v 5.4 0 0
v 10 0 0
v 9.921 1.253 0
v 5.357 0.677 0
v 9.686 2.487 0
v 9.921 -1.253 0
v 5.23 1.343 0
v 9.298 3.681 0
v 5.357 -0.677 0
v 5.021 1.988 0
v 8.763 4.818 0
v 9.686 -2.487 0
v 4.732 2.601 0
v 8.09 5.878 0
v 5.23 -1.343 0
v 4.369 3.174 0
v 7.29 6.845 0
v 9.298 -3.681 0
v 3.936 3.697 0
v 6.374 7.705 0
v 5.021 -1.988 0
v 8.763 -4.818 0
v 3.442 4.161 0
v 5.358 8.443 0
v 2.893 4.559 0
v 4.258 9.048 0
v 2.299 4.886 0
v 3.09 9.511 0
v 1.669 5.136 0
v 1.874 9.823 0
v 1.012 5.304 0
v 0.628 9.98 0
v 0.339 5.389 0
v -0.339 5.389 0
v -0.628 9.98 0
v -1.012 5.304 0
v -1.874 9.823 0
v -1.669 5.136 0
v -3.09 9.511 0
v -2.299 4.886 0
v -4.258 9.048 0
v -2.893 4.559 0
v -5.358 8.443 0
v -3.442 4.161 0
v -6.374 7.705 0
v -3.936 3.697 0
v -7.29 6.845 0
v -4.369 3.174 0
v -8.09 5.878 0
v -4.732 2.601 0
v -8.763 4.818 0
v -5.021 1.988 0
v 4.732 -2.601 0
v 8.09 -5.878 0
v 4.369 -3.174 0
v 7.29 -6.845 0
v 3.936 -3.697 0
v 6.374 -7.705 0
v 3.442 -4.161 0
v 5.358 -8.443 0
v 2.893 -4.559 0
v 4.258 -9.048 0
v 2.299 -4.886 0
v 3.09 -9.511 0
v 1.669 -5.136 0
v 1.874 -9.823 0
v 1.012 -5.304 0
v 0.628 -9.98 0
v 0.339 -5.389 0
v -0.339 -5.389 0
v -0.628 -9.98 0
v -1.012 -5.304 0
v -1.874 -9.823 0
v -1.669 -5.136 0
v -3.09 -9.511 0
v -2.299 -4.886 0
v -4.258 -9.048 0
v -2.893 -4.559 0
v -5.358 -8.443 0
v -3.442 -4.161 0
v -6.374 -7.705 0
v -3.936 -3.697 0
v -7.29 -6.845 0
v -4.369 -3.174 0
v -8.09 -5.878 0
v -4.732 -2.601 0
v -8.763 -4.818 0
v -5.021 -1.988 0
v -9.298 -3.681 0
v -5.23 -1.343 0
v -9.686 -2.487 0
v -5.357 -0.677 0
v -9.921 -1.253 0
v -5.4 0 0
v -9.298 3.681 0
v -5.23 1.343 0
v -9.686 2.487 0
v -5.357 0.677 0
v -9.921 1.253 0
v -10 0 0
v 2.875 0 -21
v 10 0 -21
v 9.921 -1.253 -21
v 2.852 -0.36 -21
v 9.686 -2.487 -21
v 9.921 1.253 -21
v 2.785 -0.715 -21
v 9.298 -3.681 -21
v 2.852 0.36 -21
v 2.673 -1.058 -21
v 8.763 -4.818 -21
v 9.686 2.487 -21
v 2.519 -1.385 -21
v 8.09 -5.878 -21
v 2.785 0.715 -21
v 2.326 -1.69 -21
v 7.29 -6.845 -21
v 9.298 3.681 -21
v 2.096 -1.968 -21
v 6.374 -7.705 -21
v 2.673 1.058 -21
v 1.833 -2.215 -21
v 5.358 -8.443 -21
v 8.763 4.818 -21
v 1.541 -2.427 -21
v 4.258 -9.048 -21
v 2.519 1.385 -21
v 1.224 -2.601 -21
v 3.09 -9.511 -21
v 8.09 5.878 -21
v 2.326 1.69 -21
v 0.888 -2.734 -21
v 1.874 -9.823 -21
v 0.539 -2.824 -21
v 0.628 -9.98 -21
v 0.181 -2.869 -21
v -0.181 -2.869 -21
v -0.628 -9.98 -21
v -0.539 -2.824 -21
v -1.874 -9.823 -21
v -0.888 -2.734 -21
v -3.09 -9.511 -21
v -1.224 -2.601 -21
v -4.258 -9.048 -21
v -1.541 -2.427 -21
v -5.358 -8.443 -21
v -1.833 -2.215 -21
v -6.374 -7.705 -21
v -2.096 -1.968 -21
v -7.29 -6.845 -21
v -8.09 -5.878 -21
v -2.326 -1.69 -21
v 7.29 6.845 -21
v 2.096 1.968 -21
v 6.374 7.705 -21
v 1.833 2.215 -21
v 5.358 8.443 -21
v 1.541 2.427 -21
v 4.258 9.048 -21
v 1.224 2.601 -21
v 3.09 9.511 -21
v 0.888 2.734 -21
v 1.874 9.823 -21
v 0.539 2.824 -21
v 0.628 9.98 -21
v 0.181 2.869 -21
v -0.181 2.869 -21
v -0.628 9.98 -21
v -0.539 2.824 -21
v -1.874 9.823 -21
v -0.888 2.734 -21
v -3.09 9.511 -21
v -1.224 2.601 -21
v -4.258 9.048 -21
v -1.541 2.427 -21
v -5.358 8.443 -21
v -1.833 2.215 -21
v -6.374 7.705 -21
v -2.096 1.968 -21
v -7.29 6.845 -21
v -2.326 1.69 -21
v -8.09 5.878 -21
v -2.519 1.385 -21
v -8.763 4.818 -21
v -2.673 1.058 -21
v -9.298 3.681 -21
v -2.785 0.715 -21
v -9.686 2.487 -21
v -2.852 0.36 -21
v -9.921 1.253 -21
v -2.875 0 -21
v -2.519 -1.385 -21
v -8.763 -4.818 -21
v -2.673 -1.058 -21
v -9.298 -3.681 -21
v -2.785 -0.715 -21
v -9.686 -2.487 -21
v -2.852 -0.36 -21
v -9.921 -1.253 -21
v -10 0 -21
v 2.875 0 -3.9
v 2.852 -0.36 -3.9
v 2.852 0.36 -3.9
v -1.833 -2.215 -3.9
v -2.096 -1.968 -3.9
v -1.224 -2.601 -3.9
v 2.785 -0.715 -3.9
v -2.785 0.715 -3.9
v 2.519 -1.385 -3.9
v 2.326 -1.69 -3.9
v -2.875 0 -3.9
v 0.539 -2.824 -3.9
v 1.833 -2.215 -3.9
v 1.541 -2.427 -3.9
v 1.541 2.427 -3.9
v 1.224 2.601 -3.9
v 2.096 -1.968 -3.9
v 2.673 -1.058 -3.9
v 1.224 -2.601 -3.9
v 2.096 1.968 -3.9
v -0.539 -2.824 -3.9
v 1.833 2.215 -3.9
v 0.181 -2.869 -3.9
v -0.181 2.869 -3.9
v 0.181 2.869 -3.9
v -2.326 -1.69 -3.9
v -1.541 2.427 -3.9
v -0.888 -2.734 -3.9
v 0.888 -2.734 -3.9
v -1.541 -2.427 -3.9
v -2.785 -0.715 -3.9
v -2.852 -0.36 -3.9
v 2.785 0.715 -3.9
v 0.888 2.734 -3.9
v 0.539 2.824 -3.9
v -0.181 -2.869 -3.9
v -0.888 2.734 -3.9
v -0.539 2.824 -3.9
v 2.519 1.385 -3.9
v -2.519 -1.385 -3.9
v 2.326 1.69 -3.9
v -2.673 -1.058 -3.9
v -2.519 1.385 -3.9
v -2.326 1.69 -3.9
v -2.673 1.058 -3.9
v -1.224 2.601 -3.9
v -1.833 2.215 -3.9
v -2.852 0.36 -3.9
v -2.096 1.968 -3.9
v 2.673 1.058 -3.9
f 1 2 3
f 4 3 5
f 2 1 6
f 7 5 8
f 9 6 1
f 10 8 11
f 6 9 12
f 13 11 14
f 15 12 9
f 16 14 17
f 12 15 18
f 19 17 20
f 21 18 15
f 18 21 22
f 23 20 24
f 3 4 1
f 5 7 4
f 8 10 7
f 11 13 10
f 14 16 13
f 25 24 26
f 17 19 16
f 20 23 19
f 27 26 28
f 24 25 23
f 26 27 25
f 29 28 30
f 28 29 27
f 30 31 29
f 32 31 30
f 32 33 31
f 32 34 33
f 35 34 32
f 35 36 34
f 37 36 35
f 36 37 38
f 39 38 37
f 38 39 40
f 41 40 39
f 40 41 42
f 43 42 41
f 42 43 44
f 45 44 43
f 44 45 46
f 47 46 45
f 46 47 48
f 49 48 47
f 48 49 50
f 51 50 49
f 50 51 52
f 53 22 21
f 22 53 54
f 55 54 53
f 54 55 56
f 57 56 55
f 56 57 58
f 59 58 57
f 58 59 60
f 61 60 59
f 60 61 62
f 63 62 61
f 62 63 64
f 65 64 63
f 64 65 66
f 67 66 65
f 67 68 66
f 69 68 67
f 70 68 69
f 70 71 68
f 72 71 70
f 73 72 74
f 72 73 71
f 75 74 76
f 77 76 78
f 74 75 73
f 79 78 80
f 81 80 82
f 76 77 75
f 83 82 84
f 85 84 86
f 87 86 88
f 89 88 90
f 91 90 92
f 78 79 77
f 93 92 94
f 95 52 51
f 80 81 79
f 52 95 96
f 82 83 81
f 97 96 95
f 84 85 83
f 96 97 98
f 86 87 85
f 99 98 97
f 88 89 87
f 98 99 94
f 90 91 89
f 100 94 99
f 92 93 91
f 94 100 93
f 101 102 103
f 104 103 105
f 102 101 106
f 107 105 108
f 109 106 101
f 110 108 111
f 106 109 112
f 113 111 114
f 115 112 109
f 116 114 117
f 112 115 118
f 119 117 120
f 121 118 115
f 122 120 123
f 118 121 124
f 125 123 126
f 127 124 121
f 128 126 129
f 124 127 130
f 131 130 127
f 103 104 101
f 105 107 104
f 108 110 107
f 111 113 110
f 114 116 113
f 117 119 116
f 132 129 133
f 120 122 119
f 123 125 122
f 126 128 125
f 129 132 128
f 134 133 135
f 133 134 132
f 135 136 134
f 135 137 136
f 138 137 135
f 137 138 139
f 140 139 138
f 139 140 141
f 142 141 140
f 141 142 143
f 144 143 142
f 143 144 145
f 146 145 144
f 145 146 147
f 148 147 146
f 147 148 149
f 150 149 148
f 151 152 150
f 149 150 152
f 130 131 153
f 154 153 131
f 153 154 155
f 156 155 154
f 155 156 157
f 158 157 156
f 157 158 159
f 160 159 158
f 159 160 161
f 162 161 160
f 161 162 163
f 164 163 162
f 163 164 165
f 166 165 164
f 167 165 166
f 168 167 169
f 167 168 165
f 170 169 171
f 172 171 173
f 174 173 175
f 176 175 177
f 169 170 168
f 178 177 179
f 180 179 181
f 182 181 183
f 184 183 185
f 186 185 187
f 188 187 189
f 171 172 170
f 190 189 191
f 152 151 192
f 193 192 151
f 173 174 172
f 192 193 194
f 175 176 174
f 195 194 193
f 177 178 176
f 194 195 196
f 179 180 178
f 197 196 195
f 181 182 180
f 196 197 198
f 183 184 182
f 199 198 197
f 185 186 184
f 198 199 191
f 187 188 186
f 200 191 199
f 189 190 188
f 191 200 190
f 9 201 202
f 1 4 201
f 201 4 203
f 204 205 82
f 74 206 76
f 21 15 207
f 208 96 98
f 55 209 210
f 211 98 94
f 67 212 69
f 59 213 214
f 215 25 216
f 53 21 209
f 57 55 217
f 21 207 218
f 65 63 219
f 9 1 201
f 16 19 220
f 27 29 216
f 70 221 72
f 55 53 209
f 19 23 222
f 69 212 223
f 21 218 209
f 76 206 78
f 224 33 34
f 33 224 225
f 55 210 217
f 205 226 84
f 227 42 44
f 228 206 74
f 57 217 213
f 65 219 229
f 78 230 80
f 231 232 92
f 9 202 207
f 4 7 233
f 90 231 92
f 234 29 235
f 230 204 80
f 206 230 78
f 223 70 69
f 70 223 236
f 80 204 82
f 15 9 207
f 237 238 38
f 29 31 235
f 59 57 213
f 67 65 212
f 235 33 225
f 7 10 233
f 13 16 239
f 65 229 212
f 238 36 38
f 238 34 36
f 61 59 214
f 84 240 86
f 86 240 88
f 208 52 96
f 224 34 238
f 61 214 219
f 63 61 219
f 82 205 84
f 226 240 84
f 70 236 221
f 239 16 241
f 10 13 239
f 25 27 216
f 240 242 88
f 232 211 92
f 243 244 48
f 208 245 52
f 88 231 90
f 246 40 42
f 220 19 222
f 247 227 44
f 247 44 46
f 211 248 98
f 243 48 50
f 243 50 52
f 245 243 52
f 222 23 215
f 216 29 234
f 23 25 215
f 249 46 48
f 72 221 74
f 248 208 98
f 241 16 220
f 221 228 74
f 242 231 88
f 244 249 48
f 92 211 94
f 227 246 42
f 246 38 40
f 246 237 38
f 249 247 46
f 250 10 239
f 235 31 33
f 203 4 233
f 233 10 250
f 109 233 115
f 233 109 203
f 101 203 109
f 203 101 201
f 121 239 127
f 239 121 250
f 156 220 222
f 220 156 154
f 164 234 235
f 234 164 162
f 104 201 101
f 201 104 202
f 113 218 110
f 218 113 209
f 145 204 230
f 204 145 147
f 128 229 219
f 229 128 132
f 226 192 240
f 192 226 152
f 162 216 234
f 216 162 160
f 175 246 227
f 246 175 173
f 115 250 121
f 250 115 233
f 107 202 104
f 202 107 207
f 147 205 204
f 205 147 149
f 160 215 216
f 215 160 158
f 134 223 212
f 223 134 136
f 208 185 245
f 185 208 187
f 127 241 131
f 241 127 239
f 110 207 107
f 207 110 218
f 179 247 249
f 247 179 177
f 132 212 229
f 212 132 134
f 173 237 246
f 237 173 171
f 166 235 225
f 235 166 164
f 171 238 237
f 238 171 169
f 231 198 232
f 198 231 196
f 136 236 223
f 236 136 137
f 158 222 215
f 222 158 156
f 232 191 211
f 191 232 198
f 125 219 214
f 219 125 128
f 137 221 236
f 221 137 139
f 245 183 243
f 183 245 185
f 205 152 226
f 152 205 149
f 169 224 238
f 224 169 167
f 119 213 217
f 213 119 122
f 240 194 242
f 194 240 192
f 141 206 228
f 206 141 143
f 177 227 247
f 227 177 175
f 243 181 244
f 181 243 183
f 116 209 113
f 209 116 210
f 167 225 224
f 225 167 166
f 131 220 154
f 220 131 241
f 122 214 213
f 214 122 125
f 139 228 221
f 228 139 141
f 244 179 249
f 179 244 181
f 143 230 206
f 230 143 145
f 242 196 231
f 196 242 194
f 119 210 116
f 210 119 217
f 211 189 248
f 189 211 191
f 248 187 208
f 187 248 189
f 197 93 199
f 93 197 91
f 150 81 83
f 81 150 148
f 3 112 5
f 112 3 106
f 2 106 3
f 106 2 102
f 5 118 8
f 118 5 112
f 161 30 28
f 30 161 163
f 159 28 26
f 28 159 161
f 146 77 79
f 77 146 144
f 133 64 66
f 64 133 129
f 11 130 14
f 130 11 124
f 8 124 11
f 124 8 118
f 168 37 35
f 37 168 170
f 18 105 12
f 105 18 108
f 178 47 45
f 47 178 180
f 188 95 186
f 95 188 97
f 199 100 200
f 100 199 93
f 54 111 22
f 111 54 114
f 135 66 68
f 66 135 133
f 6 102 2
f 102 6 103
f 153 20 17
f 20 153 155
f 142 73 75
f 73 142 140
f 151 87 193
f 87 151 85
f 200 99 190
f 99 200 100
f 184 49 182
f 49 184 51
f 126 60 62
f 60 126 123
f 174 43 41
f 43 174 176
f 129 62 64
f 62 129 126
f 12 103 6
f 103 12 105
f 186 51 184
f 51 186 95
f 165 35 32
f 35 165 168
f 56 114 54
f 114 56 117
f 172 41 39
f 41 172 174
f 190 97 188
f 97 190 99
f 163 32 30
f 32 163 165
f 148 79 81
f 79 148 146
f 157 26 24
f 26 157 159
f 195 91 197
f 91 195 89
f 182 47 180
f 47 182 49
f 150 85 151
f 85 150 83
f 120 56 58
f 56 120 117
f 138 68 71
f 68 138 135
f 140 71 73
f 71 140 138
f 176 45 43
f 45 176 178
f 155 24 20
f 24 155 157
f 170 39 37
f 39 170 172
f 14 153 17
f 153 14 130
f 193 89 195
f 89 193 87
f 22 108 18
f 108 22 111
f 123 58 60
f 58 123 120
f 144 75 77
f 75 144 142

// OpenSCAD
$fn = 50;


difference() {
	union() {
		translate(v = [0, 0, -21.0000000000]) {
			cylinder(h = 21, r = 10.0000000000);
		}
		cylinder(h = 0, r = 19.0000000000);
	}
	union() {
		translate(v = [0, 0, 0]) {
			rotate(a = [0, 0, 0]) {
				difference() {
					union() {
						#translate(v = [0, 0, -21.0000000000]) {
							cylinder(h = 21, r = 2.6000000000);
						}
						#translate(v = [0, 0, -3.9000000000]) {
							cylinder(h = 3.9000000000, r = 10.0000000000, r1 = 2.8750000000, r2 = 5.4000000000);
						}
						#translate(v = [0, 0, -21.0000000000]) {
							cylinder(h = 21, r = 2.8750000000);
						}
						#translate(v = [0, 0, -21.0000000000]) {
							cylinder(h = 21, r = 2.6000000000);
						}
					}
					union();
				}
			}
		}
	}
}
